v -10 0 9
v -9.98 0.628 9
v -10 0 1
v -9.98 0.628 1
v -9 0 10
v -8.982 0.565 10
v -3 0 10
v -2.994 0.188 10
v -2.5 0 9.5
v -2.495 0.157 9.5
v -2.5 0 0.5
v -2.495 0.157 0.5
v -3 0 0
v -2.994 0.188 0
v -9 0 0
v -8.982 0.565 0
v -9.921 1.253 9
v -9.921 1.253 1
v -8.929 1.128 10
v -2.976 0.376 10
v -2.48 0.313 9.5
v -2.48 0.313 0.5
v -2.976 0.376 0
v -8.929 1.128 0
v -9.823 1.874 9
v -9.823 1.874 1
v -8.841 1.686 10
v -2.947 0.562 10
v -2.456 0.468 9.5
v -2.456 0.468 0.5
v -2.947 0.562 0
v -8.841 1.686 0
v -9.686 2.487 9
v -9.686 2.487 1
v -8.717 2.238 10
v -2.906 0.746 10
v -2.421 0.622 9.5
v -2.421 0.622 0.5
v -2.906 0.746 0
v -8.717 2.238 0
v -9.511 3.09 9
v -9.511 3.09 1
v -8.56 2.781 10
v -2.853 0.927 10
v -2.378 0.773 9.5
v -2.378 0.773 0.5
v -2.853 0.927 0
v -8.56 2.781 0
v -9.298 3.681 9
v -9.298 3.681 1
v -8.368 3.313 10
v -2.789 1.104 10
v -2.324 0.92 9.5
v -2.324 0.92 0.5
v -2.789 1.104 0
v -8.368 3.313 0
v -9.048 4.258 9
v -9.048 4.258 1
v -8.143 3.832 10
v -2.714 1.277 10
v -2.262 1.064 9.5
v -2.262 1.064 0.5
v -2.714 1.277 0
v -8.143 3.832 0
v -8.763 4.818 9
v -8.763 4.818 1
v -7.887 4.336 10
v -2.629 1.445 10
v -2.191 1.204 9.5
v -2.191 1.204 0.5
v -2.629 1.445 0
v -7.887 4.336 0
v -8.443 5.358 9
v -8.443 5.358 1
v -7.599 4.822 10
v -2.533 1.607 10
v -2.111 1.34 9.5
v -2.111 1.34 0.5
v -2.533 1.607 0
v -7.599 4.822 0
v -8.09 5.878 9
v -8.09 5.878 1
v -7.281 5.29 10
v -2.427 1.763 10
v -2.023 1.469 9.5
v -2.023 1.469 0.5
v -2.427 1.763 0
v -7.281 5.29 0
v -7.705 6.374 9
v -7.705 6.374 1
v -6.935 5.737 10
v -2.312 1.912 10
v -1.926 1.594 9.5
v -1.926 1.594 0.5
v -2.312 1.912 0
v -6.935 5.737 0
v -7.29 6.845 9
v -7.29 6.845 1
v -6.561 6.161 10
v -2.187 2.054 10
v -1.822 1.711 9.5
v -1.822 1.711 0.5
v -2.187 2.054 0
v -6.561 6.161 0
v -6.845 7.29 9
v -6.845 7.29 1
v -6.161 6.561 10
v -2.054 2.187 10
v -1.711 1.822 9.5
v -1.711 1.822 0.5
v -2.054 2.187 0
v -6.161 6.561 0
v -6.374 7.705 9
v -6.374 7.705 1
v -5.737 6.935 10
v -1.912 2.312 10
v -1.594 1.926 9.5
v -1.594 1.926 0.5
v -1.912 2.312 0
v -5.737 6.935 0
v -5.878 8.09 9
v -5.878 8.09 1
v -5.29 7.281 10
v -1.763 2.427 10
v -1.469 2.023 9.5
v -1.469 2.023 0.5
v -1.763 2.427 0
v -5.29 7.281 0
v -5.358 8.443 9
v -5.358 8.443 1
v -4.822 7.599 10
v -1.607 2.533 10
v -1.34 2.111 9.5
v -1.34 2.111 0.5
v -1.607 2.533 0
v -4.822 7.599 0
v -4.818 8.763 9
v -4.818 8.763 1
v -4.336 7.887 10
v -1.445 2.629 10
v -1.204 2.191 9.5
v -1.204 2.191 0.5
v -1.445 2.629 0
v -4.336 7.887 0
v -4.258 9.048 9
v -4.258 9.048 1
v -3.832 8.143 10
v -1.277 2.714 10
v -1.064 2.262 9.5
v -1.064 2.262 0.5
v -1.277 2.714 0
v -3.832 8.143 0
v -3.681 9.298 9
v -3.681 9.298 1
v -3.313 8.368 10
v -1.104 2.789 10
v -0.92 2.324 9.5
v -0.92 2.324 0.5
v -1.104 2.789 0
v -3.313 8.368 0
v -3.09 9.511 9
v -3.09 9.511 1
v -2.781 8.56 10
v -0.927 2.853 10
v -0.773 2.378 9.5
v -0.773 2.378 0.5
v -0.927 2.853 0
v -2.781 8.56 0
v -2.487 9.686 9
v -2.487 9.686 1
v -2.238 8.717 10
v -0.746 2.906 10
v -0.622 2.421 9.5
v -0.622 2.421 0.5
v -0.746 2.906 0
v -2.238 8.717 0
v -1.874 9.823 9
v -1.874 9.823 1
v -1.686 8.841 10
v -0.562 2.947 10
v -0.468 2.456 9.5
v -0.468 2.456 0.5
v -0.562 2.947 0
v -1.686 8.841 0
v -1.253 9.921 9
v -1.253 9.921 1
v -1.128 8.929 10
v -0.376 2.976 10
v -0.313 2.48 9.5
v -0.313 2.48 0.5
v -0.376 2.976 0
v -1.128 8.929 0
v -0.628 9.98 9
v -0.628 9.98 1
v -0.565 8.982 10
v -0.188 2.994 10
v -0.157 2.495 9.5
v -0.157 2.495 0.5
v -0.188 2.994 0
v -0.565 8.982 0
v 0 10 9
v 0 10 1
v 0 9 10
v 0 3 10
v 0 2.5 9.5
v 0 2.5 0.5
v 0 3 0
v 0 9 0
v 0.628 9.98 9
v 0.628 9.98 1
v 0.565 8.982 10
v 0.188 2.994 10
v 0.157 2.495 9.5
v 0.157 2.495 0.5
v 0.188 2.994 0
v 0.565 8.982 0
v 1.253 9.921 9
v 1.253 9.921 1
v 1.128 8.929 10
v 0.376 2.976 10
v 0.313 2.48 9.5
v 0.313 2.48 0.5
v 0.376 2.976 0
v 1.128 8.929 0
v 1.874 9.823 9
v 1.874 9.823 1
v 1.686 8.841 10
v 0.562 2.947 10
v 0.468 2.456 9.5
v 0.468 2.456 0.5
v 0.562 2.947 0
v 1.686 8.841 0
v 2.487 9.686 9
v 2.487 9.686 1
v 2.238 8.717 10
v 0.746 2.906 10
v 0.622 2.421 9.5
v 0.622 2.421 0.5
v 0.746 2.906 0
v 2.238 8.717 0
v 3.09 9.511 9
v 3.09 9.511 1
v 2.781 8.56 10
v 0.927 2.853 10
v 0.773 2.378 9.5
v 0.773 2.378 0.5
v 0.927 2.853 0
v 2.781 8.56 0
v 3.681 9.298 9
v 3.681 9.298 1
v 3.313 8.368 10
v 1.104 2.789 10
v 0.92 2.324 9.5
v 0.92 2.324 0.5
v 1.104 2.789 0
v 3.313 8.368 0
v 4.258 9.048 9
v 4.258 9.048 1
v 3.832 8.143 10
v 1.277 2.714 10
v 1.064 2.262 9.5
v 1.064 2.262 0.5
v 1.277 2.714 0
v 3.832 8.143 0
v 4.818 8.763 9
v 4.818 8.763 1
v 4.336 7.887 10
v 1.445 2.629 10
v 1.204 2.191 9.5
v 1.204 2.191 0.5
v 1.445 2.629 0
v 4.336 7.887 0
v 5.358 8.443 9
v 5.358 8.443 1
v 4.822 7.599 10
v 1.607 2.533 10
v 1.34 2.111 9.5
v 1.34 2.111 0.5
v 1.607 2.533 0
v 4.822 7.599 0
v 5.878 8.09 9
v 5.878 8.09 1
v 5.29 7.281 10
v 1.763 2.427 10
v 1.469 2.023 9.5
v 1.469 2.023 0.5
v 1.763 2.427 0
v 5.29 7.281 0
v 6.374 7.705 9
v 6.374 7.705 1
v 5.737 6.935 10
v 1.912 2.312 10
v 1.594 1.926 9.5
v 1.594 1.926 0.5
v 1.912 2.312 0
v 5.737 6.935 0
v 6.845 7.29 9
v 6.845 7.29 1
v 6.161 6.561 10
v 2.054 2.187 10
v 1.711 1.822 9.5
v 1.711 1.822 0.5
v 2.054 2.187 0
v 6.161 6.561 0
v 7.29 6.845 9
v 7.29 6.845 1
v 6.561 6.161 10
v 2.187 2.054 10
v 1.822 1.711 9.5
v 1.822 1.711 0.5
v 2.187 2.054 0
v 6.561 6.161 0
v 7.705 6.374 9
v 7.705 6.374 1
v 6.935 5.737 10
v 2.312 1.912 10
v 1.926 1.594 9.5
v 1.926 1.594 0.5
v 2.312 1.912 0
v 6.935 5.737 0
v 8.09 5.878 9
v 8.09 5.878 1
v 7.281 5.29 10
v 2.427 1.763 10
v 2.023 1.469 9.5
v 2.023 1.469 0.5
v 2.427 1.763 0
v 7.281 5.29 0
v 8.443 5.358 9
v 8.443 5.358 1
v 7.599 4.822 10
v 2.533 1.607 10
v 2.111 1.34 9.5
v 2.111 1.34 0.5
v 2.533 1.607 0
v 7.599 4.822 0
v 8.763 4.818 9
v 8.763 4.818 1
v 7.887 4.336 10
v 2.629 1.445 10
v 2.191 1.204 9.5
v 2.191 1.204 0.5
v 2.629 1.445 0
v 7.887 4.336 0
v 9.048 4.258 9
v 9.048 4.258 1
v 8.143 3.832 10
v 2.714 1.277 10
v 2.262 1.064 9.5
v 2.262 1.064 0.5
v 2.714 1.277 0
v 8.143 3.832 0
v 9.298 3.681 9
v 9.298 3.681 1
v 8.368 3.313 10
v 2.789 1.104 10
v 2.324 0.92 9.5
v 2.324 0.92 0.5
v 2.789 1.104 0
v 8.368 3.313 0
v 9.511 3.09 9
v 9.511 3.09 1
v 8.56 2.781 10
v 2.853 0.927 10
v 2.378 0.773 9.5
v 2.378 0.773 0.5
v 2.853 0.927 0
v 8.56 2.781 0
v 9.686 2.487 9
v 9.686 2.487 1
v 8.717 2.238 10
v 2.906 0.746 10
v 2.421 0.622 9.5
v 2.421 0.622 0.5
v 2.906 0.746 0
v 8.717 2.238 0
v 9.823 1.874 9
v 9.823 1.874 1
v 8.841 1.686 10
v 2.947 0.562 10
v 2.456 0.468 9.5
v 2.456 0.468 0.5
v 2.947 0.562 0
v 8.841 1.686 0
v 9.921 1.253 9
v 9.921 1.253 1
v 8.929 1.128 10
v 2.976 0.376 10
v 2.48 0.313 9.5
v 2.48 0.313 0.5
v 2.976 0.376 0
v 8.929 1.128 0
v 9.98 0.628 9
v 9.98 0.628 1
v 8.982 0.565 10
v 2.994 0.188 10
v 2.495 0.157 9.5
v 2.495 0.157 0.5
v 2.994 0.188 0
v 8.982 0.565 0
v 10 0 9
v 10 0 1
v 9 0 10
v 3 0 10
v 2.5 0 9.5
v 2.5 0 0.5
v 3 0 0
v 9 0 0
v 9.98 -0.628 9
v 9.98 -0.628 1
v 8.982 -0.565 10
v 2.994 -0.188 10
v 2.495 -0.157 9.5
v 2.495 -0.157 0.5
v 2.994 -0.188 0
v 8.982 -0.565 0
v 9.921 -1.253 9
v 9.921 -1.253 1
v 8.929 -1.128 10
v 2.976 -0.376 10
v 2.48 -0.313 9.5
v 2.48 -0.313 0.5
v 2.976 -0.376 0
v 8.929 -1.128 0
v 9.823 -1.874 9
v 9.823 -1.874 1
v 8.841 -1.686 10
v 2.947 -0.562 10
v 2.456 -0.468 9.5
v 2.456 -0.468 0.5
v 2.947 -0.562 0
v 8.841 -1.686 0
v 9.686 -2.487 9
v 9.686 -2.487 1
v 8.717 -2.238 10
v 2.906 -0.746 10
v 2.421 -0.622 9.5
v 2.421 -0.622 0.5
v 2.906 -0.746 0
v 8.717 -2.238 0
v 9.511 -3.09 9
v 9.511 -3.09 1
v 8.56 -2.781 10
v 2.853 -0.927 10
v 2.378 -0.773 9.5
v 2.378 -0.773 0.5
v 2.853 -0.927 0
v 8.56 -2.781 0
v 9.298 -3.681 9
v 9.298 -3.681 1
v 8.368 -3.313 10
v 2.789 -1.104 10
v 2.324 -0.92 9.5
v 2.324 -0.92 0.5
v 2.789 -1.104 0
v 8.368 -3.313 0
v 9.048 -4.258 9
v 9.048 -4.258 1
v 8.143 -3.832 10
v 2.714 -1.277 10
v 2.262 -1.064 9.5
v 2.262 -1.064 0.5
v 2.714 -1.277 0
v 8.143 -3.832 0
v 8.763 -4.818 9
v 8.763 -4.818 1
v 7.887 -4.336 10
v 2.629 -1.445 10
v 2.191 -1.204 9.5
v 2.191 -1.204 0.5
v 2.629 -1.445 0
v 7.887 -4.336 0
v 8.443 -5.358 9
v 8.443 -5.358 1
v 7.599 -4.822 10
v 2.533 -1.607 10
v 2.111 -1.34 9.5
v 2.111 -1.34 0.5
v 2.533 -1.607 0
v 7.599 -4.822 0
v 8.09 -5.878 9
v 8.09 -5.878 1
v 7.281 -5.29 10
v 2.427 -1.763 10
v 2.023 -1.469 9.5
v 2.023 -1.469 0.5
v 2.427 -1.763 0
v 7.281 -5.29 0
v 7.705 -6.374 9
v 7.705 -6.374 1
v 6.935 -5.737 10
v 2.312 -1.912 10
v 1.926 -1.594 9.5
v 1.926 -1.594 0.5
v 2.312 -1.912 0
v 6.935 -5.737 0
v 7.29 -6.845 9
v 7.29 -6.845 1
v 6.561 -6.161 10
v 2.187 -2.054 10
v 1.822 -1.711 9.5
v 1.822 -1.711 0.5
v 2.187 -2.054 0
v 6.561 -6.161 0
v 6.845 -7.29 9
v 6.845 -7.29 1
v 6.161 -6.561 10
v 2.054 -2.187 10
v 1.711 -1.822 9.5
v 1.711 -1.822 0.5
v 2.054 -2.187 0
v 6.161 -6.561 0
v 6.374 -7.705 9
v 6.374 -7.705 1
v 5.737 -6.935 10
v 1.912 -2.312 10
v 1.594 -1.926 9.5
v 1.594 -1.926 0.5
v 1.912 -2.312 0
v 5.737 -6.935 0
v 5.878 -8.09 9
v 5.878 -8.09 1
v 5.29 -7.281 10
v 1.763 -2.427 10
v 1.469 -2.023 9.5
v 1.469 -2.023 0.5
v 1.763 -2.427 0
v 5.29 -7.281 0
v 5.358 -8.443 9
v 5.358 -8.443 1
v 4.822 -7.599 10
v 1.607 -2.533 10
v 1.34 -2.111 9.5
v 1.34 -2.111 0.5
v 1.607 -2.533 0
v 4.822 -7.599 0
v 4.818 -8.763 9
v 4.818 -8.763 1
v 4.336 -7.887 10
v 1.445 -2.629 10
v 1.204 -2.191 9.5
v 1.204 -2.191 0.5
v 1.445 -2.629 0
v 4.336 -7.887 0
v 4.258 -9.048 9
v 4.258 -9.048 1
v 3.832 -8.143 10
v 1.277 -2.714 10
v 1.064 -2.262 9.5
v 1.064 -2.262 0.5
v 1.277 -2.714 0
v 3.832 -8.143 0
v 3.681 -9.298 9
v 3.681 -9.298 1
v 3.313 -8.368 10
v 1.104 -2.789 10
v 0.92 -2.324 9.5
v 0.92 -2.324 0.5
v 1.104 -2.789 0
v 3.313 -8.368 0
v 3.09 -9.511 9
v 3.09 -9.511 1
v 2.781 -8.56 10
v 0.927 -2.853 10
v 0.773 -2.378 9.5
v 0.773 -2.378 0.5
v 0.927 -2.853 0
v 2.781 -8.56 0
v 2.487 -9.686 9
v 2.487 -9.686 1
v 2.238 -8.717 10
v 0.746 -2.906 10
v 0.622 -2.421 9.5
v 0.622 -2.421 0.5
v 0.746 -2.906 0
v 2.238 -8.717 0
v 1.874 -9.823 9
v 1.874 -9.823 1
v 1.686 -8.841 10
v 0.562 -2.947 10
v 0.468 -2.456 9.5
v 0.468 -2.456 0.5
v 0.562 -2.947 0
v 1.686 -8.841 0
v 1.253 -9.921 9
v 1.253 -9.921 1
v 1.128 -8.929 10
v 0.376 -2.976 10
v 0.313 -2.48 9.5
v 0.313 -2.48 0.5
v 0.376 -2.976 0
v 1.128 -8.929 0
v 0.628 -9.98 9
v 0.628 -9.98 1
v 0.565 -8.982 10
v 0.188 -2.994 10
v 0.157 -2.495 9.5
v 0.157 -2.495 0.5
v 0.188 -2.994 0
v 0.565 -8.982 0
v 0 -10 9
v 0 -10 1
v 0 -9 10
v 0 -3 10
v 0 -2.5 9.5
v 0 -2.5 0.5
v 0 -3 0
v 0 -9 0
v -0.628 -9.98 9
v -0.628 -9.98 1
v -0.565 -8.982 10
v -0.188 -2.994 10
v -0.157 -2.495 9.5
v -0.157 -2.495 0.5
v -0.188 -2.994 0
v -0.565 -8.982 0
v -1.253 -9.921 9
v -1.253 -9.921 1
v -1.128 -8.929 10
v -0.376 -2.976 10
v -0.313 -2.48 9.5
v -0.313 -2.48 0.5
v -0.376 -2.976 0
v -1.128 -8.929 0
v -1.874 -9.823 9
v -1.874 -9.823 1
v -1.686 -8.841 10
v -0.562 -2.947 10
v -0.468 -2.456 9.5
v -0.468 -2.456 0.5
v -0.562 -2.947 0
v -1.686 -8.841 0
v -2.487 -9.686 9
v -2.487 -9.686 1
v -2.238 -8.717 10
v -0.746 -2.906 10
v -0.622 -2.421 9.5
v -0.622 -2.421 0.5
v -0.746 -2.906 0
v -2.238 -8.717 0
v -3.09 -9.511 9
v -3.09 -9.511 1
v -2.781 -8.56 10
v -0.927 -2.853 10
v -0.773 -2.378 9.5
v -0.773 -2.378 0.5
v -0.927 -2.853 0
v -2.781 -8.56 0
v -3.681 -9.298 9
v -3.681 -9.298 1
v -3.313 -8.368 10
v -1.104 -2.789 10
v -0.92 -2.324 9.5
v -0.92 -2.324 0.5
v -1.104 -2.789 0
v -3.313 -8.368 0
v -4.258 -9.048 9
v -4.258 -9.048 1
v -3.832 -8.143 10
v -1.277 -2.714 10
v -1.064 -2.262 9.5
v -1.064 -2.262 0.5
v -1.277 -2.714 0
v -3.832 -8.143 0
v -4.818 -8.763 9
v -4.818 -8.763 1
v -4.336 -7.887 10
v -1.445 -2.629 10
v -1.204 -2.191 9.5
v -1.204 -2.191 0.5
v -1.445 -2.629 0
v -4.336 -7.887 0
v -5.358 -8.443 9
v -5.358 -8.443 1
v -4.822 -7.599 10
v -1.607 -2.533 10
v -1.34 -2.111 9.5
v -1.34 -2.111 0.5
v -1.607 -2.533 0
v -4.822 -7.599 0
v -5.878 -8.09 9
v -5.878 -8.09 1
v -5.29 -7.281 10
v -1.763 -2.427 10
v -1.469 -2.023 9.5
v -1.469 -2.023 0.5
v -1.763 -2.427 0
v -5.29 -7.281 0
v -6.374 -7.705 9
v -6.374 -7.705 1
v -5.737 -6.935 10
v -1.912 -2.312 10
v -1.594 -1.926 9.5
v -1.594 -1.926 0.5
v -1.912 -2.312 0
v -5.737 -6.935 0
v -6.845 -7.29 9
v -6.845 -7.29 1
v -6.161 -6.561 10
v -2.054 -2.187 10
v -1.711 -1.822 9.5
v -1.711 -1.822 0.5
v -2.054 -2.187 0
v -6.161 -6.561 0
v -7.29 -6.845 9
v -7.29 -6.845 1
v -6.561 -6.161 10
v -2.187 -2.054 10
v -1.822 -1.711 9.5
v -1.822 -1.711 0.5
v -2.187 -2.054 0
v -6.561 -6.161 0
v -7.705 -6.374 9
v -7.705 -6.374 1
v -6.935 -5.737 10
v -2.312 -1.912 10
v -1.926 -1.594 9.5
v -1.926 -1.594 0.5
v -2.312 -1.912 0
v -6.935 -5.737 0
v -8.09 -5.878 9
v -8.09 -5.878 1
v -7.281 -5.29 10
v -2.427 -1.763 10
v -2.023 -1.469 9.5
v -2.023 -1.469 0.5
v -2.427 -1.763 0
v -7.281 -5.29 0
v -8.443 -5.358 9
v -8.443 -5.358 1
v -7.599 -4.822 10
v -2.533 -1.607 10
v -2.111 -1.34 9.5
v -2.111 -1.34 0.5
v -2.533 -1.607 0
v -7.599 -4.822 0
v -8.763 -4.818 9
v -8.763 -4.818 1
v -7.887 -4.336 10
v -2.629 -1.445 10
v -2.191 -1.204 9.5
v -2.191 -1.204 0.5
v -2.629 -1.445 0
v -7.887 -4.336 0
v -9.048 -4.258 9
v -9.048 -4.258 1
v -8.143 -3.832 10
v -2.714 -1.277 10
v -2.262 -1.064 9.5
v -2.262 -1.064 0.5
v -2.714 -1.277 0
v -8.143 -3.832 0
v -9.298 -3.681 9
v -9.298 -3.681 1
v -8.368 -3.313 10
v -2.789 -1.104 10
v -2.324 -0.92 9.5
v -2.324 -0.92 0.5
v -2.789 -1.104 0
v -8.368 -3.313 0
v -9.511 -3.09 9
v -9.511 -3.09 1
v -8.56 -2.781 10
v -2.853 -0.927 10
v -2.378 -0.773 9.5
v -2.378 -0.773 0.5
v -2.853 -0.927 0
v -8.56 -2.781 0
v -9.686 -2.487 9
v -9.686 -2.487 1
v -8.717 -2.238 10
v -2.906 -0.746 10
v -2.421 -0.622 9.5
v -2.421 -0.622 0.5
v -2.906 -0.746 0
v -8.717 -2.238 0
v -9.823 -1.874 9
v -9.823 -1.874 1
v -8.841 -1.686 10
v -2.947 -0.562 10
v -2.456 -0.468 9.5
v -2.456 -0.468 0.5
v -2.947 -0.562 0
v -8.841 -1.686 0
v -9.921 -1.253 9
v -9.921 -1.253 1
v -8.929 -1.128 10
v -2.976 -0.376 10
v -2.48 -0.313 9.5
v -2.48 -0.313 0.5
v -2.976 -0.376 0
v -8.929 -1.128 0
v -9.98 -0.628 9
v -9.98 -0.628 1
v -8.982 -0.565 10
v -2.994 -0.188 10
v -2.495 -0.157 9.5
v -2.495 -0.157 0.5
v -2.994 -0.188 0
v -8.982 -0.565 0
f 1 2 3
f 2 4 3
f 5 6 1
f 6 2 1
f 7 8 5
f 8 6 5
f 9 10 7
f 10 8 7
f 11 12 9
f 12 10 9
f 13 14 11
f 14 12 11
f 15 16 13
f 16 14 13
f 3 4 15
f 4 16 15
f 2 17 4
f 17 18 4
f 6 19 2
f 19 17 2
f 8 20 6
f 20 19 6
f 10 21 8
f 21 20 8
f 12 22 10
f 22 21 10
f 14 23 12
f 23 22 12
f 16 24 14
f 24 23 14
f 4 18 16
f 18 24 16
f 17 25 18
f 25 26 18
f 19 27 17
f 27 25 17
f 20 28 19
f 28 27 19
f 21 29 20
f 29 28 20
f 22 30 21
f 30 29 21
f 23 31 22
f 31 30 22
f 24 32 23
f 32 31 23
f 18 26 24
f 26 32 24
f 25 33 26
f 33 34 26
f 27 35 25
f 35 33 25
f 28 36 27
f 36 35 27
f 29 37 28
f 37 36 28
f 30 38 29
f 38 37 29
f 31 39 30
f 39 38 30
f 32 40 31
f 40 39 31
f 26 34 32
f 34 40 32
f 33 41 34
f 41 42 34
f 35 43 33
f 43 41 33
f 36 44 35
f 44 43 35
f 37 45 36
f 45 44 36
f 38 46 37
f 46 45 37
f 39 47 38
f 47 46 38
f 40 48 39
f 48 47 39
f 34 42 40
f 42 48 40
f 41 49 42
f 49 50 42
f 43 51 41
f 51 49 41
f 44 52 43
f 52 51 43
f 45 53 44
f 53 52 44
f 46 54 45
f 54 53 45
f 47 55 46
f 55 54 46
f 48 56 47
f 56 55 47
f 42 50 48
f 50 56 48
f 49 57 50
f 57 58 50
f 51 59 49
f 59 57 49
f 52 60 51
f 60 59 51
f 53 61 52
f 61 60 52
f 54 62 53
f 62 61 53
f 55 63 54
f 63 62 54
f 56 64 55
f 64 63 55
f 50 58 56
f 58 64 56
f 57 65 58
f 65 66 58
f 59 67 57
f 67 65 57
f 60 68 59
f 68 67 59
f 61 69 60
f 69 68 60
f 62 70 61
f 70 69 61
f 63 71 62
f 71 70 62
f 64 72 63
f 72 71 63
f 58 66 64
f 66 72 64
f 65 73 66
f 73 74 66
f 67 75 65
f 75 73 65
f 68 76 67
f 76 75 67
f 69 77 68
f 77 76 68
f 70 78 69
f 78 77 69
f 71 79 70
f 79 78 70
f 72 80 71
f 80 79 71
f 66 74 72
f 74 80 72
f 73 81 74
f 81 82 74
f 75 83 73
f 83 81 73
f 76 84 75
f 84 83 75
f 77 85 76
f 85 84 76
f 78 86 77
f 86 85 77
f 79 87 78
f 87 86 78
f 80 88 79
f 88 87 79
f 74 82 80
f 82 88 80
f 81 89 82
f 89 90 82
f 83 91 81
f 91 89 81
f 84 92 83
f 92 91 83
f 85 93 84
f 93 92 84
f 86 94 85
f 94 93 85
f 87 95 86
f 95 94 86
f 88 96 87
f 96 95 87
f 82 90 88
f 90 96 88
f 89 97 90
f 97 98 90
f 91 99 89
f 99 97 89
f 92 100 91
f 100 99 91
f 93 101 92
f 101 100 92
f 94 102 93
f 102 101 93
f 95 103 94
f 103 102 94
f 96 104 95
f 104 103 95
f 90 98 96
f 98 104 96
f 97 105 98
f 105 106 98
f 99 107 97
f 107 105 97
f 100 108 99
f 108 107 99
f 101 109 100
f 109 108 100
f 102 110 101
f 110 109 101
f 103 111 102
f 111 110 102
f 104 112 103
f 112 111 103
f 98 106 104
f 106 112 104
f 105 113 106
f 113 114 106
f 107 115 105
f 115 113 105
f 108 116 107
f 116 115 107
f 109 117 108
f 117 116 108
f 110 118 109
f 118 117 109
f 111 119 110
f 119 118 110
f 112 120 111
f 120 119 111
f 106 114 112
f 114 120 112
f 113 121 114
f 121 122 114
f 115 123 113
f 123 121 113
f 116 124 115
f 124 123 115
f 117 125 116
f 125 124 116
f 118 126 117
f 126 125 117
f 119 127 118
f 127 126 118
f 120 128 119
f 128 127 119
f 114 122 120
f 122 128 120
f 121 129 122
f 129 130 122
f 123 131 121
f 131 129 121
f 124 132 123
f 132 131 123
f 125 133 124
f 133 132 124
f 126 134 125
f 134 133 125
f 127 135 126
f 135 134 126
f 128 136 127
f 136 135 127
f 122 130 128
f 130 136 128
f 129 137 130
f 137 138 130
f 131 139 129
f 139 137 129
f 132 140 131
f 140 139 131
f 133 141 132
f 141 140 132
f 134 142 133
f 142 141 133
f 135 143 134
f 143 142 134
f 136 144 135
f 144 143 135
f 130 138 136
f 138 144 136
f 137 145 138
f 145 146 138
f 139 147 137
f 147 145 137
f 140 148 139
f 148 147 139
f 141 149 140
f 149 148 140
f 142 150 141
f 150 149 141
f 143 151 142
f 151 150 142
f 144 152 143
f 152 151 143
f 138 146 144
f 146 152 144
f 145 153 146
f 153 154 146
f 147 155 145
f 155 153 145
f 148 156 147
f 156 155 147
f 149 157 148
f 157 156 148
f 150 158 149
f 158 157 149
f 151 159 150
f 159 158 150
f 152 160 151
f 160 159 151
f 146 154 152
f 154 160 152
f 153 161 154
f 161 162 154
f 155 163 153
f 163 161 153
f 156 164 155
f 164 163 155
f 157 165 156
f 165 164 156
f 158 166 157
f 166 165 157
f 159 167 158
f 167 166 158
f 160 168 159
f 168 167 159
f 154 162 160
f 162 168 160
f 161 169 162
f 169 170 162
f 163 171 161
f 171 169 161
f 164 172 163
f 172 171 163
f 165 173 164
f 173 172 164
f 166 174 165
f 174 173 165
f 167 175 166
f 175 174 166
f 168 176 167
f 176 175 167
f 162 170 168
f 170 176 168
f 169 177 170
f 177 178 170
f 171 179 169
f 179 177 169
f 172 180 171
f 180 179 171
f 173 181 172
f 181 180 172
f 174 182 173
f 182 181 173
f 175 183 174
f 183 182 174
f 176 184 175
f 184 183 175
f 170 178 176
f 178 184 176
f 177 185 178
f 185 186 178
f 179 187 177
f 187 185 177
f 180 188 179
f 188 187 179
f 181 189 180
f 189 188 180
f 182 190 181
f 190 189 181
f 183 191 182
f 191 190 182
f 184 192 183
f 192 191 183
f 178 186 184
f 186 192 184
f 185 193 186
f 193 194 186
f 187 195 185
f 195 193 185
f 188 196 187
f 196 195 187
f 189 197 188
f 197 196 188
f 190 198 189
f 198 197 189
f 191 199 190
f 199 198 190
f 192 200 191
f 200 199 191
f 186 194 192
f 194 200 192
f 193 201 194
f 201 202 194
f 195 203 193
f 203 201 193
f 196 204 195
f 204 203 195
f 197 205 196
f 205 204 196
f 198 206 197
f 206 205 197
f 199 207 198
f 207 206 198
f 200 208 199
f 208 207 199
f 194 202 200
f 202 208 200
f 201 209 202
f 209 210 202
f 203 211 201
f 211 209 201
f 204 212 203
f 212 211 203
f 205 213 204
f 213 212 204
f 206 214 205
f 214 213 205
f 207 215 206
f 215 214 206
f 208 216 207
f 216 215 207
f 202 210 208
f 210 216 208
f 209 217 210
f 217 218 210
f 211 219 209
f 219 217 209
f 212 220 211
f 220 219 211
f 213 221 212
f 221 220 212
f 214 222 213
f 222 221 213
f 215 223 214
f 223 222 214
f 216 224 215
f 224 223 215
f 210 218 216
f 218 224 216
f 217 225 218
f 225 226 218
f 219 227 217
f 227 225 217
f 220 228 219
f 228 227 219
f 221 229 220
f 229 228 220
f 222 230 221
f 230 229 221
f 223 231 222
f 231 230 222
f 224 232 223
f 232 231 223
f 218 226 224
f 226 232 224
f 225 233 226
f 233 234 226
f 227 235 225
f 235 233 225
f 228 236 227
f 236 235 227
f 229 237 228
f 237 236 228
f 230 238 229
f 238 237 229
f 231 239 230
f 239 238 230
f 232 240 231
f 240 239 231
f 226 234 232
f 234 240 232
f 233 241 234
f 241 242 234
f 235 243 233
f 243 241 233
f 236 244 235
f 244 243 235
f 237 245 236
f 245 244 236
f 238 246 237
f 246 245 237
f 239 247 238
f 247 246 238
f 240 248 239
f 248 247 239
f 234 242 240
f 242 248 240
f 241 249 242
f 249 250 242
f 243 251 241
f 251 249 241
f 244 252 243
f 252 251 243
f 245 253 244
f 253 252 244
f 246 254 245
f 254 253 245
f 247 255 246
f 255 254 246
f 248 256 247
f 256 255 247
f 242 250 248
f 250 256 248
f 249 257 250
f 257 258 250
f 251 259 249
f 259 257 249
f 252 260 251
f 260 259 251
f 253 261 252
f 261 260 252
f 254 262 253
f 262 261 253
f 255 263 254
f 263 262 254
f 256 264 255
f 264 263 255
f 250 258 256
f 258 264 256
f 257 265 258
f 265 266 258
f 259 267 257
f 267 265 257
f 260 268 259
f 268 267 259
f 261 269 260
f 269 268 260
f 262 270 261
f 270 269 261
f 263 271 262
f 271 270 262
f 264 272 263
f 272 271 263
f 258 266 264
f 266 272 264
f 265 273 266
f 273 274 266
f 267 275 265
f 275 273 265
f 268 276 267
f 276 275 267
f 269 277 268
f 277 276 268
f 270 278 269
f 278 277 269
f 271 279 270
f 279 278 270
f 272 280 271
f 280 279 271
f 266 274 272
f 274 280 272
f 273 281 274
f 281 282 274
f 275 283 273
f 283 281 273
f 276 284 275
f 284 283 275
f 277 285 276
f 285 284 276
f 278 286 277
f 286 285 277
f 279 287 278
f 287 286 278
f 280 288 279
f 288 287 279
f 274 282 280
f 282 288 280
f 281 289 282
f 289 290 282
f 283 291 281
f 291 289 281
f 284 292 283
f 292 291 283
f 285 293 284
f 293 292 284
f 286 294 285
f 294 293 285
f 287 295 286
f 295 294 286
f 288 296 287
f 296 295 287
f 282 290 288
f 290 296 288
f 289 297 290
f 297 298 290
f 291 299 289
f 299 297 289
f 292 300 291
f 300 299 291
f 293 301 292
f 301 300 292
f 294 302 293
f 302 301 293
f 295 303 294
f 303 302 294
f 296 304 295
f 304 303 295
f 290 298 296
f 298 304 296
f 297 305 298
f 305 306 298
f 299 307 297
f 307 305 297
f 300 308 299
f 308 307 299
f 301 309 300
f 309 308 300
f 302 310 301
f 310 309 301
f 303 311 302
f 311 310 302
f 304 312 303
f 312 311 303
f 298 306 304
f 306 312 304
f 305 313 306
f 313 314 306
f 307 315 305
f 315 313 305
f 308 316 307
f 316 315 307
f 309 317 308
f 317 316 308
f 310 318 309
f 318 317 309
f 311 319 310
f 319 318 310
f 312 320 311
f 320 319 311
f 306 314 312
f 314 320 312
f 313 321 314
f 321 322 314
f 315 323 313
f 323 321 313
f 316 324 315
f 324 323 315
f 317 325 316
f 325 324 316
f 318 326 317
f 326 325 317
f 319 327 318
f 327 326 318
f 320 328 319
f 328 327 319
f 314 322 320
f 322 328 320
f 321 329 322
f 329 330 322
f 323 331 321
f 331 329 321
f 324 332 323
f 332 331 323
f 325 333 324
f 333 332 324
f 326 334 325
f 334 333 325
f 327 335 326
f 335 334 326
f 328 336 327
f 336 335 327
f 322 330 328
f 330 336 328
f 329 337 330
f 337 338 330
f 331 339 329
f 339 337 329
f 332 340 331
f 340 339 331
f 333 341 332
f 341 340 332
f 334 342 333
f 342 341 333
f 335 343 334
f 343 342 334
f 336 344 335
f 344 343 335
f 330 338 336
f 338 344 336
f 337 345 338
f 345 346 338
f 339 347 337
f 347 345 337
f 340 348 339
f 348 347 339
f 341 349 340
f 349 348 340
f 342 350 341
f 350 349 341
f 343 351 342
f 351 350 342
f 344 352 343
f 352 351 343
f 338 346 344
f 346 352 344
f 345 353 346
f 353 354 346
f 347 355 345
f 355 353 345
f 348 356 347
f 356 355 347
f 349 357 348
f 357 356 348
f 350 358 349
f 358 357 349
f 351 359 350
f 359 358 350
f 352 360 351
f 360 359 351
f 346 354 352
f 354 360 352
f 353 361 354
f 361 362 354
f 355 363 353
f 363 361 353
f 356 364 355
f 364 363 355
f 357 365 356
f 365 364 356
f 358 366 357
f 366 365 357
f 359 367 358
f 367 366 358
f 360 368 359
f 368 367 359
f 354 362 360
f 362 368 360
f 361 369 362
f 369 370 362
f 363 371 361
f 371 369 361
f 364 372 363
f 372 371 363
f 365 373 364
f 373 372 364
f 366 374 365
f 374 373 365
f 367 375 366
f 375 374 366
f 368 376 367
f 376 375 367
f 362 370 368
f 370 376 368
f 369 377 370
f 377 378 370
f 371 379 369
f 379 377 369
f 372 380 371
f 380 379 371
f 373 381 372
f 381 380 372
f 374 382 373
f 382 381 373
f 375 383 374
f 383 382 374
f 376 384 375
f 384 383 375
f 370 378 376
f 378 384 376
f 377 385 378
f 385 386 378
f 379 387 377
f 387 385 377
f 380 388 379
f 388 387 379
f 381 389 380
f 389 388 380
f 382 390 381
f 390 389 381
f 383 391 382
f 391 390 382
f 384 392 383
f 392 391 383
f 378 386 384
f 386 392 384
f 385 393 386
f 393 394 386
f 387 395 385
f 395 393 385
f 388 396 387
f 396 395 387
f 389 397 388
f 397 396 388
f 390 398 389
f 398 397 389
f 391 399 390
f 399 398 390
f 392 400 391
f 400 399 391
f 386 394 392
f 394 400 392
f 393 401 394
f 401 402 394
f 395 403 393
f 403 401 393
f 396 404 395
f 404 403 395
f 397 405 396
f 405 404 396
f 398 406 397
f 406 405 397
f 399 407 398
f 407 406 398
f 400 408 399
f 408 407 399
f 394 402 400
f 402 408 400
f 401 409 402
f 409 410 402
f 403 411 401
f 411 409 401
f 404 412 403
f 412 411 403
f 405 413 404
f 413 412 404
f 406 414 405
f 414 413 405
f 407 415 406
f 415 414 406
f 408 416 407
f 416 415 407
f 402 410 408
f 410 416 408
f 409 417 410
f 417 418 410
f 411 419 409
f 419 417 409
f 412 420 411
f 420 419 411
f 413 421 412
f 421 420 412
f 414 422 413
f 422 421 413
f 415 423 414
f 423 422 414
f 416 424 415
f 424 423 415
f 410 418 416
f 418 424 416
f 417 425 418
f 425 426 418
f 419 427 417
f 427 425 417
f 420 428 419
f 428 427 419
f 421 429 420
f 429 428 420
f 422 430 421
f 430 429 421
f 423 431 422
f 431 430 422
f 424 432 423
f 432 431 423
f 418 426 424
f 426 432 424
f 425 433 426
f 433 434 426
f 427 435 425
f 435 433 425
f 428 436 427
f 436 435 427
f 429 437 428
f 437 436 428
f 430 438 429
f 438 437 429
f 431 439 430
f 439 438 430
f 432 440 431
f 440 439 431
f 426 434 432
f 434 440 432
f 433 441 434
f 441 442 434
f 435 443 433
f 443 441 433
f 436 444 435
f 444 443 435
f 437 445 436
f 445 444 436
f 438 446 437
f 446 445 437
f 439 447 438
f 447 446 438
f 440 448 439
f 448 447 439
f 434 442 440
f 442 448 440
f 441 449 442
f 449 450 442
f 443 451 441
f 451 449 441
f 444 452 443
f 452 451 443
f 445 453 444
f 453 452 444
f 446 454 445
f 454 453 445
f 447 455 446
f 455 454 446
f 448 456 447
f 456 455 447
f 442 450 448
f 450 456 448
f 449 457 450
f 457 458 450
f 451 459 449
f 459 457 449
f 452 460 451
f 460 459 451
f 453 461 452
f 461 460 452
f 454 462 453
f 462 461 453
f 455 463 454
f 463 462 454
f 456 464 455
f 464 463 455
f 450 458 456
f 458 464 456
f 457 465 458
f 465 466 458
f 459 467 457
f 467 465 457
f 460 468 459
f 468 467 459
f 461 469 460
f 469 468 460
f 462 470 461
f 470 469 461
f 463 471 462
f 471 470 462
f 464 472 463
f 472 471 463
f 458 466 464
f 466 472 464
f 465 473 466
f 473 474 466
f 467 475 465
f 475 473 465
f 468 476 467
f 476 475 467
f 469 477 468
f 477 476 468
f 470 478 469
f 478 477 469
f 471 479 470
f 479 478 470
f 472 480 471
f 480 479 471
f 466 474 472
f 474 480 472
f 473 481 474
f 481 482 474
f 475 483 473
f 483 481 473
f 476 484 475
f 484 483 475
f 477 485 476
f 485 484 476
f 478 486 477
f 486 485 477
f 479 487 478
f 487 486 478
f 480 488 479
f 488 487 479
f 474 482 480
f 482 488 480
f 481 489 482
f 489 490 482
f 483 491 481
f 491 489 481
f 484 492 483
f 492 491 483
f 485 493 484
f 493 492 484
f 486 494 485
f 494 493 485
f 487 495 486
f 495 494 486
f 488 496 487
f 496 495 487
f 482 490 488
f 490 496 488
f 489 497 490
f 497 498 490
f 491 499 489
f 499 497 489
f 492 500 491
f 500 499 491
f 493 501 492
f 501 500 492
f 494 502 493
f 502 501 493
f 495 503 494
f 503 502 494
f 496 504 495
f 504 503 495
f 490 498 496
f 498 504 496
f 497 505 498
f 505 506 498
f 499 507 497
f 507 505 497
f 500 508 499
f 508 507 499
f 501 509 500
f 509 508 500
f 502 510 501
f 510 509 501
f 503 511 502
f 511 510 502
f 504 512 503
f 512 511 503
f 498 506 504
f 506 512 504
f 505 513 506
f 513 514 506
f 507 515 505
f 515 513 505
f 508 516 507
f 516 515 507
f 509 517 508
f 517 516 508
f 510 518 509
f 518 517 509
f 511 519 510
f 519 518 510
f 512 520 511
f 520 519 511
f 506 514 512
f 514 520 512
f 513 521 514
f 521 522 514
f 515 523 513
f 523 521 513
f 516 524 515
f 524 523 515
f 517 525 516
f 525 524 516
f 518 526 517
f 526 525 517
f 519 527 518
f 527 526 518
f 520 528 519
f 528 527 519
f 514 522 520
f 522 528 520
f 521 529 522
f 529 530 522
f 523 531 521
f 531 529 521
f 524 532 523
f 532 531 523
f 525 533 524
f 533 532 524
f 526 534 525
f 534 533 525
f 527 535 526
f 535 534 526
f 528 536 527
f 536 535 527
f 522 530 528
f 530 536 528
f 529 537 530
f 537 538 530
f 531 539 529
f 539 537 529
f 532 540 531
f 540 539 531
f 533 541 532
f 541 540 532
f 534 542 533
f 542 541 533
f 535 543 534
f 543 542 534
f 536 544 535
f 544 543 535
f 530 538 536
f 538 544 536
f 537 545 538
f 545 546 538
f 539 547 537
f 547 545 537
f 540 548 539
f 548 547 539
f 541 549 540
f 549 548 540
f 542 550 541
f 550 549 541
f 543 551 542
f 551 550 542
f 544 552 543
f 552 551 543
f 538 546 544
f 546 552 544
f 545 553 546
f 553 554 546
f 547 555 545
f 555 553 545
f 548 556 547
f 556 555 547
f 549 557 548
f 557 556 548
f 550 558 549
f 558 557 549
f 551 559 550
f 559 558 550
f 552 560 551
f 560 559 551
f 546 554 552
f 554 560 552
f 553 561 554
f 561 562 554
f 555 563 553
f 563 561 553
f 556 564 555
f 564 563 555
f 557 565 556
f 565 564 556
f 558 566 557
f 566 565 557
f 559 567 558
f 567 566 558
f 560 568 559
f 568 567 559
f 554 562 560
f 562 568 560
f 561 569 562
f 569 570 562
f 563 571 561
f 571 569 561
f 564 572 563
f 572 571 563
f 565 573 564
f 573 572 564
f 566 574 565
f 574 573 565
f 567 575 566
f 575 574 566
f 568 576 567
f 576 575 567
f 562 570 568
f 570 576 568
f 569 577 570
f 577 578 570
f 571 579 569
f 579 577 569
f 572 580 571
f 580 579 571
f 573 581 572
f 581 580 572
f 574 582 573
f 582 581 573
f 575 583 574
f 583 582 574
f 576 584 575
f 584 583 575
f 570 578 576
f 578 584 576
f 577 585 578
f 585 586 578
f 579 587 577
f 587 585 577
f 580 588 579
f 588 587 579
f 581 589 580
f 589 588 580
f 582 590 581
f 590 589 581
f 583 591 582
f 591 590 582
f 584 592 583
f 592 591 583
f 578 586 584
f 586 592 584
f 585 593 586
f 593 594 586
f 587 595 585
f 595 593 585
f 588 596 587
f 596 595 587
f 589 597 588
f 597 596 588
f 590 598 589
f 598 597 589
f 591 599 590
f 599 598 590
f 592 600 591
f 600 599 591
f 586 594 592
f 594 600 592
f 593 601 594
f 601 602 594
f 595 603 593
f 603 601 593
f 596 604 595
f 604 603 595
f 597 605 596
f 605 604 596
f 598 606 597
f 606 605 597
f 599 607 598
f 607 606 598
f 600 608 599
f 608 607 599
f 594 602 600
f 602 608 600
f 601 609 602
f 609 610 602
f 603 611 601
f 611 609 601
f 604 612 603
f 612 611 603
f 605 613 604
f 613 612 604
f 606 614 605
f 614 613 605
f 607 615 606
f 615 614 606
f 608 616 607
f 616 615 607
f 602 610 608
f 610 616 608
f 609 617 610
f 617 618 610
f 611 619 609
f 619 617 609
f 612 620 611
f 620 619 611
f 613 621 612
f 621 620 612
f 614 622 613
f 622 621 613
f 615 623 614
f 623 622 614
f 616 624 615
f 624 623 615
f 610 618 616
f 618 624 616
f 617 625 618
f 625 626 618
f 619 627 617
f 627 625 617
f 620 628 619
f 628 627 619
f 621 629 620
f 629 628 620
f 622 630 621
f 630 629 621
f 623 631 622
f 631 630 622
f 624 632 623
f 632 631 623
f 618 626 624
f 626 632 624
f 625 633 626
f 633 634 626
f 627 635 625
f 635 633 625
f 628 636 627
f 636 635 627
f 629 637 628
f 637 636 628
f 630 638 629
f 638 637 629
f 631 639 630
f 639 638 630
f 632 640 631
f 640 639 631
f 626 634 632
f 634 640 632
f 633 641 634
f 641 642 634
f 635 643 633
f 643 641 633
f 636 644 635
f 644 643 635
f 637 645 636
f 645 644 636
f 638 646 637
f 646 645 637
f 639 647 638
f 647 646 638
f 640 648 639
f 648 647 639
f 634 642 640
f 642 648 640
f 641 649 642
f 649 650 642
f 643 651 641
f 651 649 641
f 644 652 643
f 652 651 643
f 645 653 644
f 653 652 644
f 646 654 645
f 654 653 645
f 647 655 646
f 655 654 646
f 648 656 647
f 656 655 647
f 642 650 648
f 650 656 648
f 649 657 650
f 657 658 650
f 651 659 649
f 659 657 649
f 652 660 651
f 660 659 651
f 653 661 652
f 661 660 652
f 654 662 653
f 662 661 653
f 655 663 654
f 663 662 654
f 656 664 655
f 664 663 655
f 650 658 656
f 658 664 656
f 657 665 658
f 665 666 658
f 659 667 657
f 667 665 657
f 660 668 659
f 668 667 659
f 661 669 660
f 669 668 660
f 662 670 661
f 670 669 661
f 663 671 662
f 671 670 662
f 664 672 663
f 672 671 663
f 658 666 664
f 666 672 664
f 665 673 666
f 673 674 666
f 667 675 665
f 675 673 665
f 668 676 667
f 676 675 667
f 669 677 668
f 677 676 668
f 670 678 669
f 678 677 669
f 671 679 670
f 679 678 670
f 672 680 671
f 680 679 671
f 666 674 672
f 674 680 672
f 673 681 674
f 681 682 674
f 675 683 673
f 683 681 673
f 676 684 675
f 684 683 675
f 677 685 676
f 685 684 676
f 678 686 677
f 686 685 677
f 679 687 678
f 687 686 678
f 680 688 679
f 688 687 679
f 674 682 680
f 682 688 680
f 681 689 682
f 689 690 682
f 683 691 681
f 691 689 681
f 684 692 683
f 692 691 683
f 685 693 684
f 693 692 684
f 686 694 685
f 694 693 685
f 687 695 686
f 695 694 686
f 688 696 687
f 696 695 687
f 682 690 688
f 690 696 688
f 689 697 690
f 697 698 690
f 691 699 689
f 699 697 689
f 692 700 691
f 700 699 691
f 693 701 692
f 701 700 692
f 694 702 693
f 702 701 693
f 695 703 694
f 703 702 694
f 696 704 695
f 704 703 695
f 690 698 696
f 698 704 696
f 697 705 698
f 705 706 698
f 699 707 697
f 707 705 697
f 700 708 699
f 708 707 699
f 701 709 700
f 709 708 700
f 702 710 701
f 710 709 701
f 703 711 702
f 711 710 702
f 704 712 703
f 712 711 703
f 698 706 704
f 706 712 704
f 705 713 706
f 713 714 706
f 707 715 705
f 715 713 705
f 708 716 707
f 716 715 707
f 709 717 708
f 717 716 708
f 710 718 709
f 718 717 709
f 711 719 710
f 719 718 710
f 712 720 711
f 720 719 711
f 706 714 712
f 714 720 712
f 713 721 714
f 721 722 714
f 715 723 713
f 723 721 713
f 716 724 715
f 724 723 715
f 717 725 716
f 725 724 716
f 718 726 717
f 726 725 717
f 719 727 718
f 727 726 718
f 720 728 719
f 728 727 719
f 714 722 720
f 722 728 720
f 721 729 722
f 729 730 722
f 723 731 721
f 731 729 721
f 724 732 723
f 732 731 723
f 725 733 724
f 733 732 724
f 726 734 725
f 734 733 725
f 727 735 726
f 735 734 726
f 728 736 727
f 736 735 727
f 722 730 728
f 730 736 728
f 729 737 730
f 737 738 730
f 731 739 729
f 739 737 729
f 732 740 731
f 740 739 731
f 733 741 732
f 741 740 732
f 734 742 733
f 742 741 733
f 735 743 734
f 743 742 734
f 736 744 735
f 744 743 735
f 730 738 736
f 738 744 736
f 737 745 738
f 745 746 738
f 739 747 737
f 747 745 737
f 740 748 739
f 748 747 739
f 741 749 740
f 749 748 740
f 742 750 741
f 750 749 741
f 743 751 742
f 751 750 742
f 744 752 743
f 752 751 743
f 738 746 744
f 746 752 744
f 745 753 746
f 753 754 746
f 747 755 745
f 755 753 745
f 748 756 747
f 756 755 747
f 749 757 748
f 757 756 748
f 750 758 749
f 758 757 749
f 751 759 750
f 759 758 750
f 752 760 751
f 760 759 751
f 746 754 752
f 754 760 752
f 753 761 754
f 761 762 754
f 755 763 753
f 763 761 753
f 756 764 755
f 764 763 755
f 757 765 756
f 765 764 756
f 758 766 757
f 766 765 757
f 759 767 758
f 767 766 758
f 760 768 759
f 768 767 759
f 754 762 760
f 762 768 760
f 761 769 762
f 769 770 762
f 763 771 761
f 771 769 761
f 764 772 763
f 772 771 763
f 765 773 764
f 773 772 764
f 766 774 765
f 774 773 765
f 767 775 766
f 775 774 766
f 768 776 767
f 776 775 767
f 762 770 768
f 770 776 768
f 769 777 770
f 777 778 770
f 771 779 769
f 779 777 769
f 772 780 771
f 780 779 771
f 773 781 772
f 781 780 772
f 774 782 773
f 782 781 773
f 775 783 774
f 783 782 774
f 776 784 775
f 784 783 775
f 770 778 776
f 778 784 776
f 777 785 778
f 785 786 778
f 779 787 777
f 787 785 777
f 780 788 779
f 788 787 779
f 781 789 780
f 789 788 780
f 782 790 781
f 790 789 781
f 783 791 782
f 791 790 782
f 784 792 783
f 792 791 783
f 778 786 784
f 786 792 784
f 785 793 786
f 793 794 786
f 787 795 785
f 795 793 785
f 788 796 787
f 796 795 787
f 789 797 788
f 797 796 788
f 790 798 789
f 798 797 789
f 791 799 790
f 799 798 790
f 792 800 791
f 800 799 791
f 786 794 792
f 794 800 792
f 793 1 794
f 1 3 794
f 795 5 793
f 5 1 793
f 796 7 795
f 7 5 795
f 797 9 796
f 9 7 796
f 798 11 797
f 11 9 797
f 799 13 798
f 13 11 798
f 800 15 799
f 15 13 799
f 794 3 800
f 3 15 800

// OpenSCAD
// Spacer.scad
// Version: v0.03
// Description: Parametric cylindrical spacer

/* [Dimensions] */
// Inner diameter (mm, ignored if bolt_size is not None)
id = 5.0;

/* [Bolt Settings] */
// Select bolt size to automatically set inner diameter
bolt_size = "None"; // ["None", "M2", "M2.5", "M3", "M4", "M5", "M6", "M8", "M10"]

// Fit type for the bolt (Clearance = loose, Tap = tight for self-tapping, Threaded = 3D printed threads)
bolt_fit = "Clearance"; // ["Clearance", "Tap", "Threaded"]

// Tolerance for 3D printed threads (mm, increases hole size for easier fit)
thread_tolerance = 0.2;

// Outer diameter (mm)
od = 20.0;

// Length/Height (mm)
length = 10.0;

/* [Features] */
// Outer edge chamfer (mm, 0 for no chamfer)
outer_chamfer = 1.0;

// Inner edge chamfer (mm, 0 for no chamfer)
inner_chamfer = 0.5;

/* [Settings] */
// Resolution (higher value for smoother curves)
$fn = 100;

module spacer(inner_d, outer_d, h, out_chamfer, in_chamfer) {
    r_in = inner_d / 2;
    // Ensure outer radius is strictly larger than inner radius to avoid invalid geometry
    r_out = max(outer_d / 2, r_in + 0.01);

    // Prevent chamfers from overlapping or exceeding dimensions
    oc = max(0, min(out_chamfer, h / 2, (r_out - r_in) / 2));
    ic = max(0, min(in_chamfer, h / 2, (r_out - r_in) / 2));

    rotate_extrude() {
        polygon([
            [r_in + ic, 0],
            [r_out - oc, 0],
            [r_out, oc],
            [r_out, h - oc],
            [r_out - oc, h],
            [r_in + ic, h],
            [r_in, h - ic],
            [r_in, ic]
        ]);
    }
}

function get_bolt_pitch(size) =
    size == "M2"   ? 0.4 :
    size == "M2.5" ? 0.45 :
    size == "M3"   ? 0.5 :
    size == "M4"   ? 0.7 :
    size == "M5"   ? 0.8 :
    size == "M6"   ? 1.0 :
    size == "M8"   ? 1.25 :
    size == "M10"  ? 1.5 : 0;

function get_bolt_nominal_dia(size) =
    size == "M2"   ? 2.0 :
    size == "M2.5" ? 2.5 :
    size == "M3"   ? 3.0 :
    size == "M4"   ? 4.0 :
    size == "M5"   ? 5.0 :
    size == "M6"   ? 6.0 :
    size == "M8"   ? 8.0 :
    size == "M10"  ? 10.0 : 0;

// Calculate actual inner diameter based on bolt size and fit
function get_bolt_dia(size, fit) =
    let (
        nom = get_bolt_nominal_dia(size),
        pitch = get_bolt_pitch(size)
    )
    fit == "Clearance" ? (
        size == "M2"   ? 2.2 :
        size == "M2.5" ? 2.7 :
        size == "M3"   ? 3.2 :
        size == "M4"   ? 4.2 :
        size == "M5"   ? 5.2 :
        size == "M6"   ? 6.2 :
        size == "M8"   ? 8.4 :
        size == "M10"  ? 10.5 : id
    ) :
    fit == "Tap" ? (
        size == "M2"   ? 1.6 :
        size == "M2.5" ? 2.05 :
        size == "M3"   ? 2.5 :
        size == "M4"   ? 3.3 :
        size == "M5"   ? 4.2 :
        size == "M6"   ? 5.0 :
        size == "M8"   ? 6.8 :
        size == "M10"  ? 8.5 : id
    ) :
    fit == "Threaded" ? (
        // For threaded, the basic hole is the minor diameter of the thread including tolerance
        nom > 0 ? (nom + thread_tolerance) - 1.082532 * pitch : id
    ) : id;

actual_id = bolt_size == "None" ? id : get_bolt_dia(bolt_size, bolt_fit);

module thread_cutter(d, pitch, length, tol) {
    r_maj = (d + tol) / 2;
    r_min = r_maj - 0.54127 * pitch;
    segments = $fn > 0 ? max($fn, 12) : 36;

    z_start = -0.1;
    z_end = length + 0.1;
    cut_length = z_end - z_start;

    turns = cut_length / pitch;
    steps = ceil(turns * segments);
    dz = cut_length / steps;
    da = 360 / segments;

    function r_at(phase) =
        let(p = phase < 0 ? phase - floor(phase) : phase - floor(phase))
        p < 0.5 ? r_min + (r_maj - r_min) * (p * 2)
                : r_maj - (r_maj - r_min) * ((p - 0.5) * 2);

    function pt(j, i) = j*segments + i;

    bot_center = (steps + 1) * segments;
    top_center = bot_center + 1;

    vertices = [
        for (j=[0:steps])
            for (i=[0:segments-1])
                let(
                    z = z_start + j * dz,
                    theta = i * da,
                    phase = z / pitch - theta / 360,
                    r = r_at(phase)
                )
                [r * cos(theta), r * sin(theta), z],
        [0, 0, z_start],
        [0, 0, z_end]
    ];

    faces_side = [
        for (j=[0:steps-1])
            for (i=[0:segments-1])
                let(n = (i+1)%segments)
                each [
                    [pt(j, i), pt(j+1, n), pt(j, n)],
                    [pt(j+1, i), pt(j+1, n), pt(j, i)]
                ]
    ];

    faces_bottom = [
        for (i=[0:segments-1])
            let(n = (i+1)%segments)
            [bot_center, pt(0, i), pt(0, n)]
    ];

    faces_top = [
        for (i=[0:segments-1])
            let(n = (i+1)%segments)
            [top_center, pt(steps, n), pt(steps, i)]
    ];

    polyhedron(points=vertices, faces=concat(faces_side, faces_bottom, faces_top), convexity=10);
}

// Generate the spacer
if (bolt_size != "None" && bolt_fit == "Threaded") {
    difference() {
        spacer(inner_d=actual_id, outer_d=od, h=length, out_chamfer=outer_chamfer, in_chamfer=inner_chamfer);
        thread_cutter(d=get_bolt_nominal_dia(bolt_size), pitch=get_bolt_pitch(bolt_size), length=length, tol=thread_tolerance);
    }
} else {
    spacer(inner_d=actual_id, outer_d=od, h=length, out_chamfer=outer_chamfer, in_chamfer=inner_chamfer);
}
